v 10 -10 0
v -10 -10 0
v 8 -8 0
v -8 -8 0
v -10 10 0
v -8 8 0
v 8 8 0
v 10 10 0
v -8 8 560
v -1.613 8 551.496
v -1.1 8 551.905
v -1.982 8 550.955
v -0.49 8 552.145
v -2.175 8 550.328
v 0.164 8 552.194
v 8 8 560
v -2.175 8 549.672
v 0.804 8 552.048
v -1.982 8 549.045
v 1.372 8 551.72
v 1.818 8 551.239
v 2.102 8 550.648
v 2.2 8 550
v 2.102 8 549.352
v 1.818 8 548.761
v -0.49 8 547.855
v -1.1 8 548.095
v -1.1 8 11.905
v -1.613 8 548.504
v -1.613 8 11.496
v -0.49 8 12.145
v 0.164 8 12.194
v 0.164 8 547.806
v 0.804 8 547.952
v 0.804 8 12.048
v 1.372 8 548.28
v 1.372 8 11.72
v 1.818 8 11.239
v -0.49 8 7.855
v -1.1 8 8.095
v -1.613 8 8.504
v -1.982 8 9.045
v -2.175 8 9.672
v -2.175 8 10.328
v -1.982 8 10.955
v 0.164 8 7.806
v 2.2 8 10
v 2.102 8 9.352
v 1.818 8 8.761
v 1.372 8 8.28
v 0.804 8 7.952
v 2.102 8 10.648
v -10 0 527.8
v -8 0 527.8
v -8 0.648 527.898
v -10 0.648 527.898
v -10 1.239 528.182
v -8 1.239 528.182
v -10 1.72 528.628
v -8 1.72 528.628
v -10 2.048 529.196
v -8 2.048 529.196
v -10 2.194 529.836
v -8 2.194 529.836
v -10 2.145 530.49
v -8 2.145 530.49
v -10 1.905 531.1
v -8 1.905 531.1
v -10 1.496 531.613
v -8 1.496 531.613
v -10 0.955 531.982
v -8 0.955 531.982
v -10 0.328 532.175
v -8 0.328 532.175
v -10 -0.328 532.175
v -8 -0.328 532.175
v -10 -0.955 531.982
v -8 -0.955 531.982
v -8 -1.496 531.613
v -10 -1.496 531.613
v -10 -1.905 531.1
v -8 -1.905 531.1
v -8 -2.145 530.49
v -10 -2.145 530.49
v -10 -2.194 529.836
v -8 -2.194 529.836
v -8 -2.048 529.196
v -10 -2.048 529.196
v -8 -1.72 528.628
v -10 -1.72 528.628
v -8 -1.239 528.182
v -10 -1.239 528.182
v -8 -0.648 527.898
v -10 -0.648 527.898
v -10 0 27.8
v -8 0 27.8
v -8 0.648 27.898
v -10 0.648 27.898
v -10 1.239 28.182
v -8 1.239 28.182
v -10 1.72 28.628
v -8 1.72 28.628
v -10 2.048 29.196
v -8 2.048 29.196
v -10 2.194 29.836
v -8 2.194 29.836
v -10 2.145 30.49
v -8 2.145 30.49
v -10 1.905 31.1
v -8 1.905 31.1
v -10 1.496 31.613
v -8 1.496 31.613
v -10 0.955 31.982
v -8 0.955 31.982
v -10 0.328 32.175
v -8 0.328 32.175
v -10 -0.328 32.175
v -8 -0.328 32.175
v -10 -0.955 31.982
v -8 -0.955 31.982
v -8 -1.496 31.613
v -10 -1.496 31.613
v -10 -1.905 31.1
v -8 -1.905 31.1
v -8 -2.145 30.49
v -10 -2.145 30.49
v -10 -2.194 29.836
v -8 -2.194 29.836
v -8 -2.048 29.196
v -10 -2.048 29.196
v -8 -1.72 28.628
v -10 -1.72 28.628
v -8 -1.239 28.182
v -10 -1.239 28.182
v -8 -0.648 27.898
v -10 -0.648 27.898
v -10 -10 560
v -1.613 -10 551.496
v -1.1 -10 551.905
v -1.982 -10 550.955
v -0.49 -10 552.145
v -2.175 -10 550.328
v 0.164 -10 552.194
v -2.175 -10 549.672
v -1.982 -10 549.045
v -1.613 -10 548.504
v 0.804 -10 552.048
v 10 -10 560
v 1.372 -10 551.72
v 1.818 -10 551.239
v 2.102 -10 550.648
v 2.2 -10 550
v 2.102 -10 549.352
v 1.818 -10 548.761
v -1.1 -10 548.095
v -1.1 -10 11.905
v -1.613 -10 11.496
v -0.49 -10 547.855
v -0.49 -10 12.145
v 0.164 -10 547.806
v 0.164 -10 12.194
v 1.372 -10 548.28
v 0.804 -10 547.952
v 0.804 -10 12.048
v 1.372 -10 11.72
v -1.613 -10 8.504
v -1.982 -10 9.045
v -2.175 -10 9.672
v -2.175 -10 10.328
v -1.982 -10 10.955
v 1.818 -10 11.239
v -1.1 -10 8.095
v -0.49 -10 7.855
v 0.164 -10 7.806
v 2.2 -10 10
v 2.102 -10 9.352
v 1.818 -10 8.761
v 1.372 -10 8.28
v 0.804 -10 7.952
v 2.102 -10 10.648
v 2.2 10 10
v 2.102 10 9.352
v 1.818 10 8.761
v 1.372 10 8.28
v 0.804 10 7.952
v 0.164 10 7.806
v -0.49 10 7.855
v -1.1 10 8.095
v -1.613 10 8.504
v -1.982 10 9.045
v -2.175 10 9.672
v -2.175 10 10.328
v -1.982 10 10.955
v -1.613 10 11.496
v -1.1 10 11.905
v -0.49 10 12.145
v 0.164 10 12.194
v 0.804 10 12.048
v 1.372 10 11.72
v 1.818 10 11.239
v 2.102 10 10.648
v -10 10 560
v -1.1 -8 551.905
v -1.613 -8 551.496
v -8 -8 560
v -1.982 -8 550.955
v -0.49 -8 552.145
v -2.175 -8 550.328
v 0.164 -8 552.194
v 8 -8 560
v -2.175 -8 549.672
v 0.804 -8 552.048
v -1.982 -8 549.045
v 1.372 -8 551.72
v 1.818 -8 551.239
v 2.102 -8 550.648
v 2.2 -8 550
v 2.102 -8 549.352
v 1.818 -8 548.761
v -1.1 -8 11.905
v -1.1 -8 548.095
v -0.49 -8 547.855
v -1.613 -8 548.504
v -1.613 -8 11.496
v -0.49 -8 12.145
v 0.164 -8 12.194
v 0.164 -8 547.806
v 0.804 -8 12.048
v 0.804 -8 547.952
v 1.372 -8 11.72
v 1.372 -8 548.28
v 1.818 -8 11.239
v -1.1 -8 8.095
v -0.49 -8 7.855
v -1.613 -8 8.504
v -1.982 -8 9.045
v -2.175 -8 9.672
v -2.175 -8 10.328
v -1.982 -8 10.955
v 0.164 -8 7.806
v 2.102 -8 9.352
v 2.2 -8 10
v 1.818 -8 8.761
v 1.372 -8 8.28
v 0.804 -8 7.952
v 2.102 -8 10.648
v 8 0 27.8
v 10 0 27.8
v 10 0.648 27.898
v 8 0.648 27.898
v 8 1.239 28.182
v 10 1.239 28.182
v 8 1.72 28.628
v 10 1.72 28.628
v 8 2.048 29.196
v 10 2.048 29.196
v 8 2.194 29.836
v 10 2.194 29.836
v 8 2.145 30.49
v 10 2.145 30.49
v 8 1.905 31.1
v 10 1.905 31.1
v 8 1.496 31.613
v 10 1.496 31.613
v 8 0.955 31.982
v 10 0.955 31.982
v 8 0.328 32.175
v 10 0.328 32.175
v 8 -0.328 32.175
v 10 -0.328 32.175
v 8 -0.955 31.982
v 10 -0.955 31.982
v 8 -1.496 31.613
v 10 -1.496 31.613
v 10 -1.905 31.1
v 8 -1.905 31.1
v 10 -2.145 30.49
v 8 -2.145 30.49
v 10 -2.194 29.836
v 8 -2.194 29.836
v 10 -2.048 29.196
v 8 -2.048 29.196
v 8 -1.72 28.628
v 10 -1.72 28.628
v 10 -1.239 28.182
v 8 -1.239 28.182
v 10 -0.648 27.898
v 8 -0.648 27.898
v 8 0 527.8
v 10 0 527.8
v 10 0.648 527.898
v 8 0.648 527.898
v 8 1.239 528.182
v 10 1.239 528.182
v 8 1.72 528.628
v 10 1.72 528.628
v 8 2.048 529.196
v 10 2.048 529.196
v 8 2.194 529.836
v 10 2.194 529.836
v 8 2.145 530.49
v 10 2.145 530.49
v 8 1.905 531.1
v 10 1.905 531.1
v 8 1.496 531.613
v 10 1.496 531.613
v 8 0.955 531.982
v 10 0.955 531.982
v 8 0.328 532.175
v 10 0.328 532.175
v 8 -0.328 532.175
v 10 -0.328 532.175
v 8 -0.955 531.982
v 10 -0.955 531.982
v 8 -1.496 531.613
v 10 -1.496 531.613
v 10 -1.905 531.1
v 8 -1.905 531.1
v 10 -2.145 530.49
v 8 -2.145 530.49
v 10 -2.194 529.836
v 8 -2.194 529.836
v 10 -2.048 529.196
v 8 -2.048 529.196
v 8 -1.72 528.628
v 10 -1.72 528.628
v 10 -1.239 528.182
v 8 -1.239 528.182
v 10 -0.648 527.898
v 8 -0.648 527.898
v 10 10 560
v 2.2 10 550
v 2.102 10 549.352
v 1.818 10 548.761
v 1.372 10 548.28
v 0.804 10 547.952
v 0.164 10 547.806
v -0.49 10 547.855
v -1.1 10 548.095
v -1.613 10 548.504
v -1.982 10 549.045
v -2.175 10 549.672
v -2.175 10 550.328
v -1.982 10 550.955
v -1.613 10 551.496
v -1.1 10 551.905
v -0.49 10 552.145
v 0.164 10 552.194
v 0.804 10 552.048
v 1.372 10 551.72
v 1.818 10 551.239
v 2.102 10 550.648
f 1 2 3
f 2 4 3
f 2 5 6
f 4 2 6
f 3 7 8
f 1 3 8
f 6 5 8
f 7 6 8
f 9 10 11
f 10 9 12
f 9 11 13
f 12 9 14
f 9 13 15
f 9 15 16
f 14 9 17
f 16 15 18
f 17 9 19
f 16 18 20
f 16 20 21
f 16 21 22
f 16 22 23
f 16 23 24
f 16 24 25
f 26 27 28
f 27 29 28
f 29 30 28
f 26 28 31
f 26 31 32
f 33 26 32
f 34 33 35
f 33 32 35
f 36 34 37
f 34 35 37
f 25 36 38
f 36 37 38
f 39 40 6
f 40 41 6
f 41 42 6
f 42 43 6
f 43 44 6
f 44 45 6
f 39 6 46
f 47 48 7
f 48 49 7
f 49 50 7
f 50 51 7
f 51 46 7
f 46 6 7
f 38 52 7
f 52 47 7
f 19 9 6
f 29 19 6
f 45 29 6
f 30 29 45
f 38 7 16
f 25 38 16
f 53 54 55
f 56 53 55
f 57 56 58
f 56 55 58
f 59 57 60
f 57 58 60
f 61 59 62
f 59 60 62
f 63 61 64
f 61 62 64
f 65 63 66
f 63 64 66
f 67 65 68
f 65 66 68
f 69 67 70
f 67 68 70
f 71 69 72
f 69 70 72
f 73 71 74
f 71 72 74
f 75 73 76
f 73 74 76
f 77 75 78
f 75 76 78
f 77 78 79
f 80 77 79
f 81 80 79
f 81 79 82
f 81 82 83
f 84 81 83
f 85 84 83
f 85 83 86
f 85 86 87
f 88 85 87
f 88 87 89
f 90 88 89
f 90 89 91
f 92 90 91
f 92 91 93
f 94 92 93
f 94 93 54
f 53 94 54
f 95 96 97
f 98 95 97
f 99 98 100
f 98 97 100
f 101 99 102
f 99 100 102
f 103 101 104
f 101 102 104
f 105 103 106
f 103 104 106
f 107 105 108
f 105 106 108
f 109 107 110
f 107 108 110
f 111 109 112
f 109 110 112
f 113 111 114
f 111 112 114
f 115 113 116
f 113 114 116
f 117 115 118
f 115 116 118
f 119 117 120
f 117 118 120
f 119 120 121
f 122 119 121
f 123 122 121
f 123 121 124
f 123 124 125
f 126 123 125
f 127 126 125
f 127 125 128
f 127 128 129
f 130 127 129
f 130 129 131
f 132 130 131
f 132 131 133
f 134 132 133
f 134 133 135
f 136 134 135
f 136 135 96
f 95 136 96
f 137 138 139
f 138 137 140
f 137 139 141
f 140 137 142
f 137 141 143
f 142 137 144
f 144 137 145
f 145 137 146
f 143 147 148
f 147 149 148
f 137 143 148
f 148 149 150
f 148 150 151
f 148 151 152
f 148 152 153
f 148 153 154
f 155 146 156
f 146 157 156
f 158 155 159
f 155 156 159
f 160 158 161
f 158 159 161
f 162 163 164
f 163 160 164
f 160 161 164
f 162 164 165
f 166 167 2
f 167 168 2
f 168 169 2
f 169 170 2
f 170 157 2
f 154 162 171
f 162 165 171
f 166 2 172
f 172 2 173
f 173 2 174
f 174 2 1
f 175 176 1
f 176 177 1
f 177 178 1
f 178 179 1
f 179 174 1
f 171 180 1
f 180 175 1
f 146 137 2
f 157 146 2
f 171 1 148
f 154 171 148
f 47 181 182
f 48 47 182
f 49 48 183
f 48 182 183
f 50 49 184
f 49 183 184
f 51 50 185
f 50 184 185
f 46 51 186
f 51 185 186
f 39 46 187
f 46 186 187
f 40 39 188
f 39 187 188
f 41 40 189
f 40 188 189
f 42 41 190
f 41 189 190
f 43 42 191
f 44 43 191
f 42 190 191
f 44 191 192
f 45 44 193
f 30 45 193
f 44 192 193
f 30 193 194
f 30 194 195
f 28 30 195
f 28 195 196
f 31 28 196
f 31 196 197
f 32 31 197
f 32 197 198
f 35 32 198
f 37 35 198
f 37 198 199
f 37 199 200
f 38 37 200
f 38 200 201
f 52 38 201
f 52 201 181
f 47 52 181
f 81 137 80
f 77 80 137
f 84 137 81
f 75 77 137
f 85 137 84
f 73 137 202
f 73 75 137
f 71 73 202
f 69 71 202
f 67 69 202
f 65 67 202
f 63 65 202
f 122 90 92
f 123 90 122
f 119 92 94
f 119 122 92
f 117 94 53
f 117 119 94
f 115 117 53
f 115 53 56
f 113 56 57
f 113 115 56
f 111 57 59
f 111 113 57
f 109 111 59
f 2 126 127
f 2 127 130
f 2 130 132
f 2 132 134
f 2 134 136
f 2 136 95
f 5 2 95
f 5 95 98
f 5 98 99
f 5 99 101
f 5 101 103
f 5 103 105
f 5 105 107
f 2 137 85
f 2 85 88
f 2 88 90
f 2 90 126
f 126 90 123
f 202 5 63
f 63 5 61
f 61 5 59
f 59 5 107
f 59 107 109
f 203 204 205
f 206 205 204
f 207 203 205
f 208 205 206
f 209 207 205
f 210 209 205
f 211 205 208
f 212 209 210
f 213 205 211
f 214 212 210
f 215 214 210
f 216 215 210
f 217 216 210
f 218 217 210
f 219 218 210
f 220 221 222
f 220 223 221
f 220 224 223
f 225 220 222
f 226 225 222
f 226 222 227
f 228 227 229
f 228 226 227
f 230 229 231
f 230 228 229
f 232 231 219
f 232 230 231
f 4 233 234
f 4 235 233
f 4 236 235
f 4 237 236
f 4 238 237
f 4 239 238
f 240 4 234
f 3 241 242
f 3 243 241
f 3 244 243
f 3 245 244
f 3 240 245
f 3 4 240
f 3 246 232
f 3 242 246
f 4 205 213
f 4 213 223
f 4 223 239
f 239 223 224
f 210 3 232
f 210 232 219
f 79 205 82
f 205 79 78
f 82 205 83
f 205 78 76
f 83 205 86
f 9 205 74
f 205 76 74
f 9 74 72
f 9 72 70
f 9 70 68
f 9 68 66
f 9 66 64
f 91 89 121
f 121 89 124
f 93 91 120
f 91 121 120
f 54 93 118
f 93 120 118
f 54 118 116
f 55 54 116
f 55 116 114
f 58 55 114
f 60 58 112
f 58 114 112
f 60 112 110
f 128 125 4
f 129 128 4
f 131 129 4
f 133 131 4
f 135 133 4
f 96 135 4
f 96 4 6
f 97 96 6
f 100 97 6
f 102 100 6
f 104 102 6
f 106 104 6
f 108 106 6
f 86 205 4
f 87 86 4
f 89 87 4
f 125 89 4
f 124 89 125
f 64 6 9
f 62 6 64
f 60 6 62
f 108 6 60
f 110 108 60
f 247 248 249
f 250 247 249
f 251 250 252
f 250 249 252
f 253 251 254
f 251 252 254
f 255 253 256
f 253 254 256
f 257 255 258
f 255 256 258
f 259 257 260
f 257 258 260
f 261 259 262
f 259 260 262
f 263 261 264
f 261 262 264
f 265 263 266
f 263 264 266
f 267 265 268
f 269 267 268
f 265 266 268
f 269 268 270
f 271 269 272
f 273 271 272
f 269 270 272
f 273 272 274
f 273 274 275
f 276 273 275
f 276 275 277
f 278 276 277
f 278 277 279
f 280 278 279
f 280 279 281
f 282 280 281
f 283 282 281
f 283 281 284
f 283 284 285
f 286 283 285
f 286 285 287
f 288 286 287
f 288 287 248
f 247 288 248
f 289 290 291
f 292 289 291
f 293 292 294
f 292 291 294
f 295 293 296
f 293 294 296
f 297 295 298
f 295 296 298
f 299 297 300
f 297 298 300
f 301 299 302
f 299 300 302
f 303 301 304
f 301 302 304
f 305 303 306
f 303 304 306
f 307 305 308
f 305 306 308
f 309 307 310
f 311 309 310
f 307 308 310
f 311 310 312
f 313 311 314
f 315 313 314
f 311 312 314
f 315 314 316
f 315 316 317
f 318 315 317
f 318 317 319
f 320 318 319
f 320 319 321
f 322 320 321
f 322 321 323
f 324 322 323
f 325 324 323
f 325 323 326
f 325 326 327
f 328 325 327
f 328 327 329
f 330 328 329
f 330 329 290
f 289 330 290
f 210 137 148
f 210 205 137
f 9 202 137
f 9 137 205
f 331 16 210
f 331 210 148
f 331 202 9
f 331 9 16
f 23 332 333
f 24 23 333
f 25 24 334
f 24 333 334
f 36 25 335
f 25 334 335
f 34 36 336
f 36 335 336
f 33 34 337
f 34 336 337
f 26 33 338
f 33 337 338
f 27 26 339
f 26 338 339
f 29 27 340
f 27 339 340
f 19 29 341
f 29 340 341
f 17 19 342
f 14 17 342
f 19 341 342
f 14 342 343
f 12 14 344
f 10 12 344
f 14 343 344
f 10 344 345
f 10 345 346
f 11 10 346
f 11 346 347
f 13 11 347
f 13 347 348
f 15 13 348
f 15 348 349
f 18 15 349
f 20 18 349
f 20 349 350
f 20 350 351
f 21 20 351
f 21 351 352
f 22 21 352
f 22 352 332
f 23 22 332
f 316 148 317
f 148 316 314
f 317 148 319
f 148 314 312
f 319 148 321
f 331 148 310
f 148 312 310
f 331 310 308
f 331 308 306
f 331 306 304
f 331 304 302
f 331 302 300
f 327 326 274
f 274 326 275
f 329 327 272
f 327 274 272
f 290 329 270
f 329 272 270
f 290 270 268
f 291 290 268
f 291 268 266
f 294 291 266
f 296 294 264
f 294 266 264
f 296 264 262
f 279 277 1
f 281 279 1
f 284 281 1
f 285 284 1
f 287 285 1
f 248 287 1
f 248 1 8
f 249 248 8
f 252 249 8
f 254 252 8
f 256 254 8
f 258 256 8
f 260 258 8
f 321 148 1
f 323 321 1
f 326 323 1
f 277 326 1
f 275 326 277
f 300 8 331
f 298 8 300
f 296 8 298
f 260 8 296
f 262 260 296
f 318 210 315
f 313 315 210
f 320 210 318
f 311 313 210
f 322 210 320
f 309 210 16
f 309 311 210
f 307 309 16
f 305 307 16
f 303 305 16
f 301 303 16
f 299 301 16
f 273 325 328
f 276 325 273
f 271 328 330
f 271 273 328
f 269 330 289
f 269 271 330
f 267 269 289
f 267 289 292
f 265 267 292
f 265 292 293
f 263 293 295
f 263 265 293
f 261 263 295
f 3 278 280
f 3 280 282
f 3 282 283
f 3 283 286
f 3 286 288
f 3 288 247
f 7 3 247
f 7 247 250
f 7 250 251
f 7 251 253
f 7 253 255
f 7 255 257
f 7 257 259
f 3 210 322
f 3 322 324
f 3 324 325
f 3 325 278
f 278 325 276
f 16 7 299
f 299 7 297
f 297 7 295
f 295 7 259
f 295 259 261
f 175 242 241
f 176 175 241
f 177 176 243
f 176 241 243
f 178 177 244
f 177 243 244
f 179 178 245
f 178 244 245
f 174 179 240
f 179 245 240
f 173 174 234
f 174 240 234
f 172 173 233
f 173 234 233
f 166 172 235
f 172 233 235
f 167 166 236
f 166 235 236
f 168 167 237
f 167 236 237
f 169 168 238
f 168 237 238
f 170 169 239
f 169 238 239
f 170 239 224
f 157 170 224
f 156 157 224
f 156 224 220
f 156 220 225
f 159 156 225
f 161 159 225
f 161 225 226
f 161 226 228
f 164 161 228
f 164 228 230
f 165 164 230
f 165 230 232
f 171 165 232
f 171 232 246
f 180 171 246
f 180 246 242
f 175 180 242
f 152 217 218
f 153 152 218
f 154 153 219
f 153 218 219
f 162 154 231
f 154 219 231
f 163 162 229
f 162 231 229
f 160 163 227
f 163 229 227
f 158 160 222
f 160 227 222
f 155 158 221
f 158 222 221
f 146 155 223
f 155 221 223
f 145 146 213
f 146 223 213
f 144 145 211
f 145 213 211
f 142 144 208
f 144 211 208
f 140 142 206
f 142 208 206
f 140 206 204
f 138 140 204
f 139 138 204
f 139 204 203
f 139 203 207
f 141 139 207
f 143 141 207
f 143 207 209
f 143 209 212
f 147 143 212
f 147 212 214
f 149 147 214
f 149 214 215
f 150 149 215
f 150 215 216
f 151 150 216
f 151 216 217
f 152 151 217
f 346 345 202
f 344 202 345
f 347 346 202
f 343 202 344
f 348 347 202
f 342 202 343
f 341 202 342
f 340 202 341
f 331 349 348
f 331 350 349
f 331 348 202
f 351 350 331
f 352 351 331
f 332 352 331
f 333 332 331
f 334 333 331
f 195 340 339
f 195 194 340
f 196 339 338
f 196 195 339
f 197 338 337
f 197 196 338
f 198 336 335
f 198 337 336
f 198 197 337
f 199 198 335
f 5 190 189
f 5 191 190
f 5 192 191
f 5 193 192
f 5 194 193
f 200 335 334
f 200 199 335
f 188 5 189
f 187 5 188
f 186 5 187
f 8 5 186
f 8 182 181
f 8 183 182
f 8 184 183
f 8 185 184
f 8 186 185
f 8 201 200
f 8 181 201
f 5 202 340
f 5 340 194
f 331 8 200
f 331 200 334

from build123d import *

# Parameters (mm, degrees)
SKETCH_1_W          = 20
SKETCH_1_H          = 20
SKETCH_1_W_2        = 16
SKETCH_1_H_2        = 16
EXTRUDE_1_DEPTH     = 560
SKETCH_3_R          = 2.2
CUT_EXTRUDE_2_DEPTH = 560
SKETCH_4_R          = 2.2
CUT_EXTRUDE_3_DEPTH = 560


with BuildPart() as part:
    # ｽｹｯﾁ1 → ﾎﾞｽ - 押し出し1 (new body)
    with BuildSketch(Plane.XY):
        Rectangle(SKETCH_1_W, SKETCH_1_H)
        Rectangle(SKETCH_1_W_2, SKETCH_1_H_2, mode=Mode.SUBTRACT)
    extrude(amount=EXTRUDE_1_DEPTH)

    # ｽｹｯﾁ3 → ｶｯﾄ - 押し出し2 (cut)
    with BuildSketch(Plane(origin=(10, 0, 0), x_dir=(0, 0, -1), z_dir=(1, 0, 0))):
        with Locations((-530, 0)):
            Circle(SKETCH_3_R)
        with Locations((-30, 0)):
            Circle(SKETCH_3_R)
    extrude(amount=-CUT_EXTRUDE_2_DEPTH, mode=Mode.SUBTRACT)

    # ｽｹｯﾁ4 → ｶｯﾄ - 押し出し3 (cut)
    with BuildSketch(Plane(origin=(0, 10, 0), x_dir=(1, 0, 0), z_dir=(0, 1, 0))):
        with Locations((0, -550)):
            Circle(SKETCH_4_R)
        with Locations((0, -10)):
            Circle(SKETCH_4_R)
    extrude(amount=-CUT_EXTRUDE_3_DEPTH, mode=Mode.SUBTRACT)


solid = part.part
